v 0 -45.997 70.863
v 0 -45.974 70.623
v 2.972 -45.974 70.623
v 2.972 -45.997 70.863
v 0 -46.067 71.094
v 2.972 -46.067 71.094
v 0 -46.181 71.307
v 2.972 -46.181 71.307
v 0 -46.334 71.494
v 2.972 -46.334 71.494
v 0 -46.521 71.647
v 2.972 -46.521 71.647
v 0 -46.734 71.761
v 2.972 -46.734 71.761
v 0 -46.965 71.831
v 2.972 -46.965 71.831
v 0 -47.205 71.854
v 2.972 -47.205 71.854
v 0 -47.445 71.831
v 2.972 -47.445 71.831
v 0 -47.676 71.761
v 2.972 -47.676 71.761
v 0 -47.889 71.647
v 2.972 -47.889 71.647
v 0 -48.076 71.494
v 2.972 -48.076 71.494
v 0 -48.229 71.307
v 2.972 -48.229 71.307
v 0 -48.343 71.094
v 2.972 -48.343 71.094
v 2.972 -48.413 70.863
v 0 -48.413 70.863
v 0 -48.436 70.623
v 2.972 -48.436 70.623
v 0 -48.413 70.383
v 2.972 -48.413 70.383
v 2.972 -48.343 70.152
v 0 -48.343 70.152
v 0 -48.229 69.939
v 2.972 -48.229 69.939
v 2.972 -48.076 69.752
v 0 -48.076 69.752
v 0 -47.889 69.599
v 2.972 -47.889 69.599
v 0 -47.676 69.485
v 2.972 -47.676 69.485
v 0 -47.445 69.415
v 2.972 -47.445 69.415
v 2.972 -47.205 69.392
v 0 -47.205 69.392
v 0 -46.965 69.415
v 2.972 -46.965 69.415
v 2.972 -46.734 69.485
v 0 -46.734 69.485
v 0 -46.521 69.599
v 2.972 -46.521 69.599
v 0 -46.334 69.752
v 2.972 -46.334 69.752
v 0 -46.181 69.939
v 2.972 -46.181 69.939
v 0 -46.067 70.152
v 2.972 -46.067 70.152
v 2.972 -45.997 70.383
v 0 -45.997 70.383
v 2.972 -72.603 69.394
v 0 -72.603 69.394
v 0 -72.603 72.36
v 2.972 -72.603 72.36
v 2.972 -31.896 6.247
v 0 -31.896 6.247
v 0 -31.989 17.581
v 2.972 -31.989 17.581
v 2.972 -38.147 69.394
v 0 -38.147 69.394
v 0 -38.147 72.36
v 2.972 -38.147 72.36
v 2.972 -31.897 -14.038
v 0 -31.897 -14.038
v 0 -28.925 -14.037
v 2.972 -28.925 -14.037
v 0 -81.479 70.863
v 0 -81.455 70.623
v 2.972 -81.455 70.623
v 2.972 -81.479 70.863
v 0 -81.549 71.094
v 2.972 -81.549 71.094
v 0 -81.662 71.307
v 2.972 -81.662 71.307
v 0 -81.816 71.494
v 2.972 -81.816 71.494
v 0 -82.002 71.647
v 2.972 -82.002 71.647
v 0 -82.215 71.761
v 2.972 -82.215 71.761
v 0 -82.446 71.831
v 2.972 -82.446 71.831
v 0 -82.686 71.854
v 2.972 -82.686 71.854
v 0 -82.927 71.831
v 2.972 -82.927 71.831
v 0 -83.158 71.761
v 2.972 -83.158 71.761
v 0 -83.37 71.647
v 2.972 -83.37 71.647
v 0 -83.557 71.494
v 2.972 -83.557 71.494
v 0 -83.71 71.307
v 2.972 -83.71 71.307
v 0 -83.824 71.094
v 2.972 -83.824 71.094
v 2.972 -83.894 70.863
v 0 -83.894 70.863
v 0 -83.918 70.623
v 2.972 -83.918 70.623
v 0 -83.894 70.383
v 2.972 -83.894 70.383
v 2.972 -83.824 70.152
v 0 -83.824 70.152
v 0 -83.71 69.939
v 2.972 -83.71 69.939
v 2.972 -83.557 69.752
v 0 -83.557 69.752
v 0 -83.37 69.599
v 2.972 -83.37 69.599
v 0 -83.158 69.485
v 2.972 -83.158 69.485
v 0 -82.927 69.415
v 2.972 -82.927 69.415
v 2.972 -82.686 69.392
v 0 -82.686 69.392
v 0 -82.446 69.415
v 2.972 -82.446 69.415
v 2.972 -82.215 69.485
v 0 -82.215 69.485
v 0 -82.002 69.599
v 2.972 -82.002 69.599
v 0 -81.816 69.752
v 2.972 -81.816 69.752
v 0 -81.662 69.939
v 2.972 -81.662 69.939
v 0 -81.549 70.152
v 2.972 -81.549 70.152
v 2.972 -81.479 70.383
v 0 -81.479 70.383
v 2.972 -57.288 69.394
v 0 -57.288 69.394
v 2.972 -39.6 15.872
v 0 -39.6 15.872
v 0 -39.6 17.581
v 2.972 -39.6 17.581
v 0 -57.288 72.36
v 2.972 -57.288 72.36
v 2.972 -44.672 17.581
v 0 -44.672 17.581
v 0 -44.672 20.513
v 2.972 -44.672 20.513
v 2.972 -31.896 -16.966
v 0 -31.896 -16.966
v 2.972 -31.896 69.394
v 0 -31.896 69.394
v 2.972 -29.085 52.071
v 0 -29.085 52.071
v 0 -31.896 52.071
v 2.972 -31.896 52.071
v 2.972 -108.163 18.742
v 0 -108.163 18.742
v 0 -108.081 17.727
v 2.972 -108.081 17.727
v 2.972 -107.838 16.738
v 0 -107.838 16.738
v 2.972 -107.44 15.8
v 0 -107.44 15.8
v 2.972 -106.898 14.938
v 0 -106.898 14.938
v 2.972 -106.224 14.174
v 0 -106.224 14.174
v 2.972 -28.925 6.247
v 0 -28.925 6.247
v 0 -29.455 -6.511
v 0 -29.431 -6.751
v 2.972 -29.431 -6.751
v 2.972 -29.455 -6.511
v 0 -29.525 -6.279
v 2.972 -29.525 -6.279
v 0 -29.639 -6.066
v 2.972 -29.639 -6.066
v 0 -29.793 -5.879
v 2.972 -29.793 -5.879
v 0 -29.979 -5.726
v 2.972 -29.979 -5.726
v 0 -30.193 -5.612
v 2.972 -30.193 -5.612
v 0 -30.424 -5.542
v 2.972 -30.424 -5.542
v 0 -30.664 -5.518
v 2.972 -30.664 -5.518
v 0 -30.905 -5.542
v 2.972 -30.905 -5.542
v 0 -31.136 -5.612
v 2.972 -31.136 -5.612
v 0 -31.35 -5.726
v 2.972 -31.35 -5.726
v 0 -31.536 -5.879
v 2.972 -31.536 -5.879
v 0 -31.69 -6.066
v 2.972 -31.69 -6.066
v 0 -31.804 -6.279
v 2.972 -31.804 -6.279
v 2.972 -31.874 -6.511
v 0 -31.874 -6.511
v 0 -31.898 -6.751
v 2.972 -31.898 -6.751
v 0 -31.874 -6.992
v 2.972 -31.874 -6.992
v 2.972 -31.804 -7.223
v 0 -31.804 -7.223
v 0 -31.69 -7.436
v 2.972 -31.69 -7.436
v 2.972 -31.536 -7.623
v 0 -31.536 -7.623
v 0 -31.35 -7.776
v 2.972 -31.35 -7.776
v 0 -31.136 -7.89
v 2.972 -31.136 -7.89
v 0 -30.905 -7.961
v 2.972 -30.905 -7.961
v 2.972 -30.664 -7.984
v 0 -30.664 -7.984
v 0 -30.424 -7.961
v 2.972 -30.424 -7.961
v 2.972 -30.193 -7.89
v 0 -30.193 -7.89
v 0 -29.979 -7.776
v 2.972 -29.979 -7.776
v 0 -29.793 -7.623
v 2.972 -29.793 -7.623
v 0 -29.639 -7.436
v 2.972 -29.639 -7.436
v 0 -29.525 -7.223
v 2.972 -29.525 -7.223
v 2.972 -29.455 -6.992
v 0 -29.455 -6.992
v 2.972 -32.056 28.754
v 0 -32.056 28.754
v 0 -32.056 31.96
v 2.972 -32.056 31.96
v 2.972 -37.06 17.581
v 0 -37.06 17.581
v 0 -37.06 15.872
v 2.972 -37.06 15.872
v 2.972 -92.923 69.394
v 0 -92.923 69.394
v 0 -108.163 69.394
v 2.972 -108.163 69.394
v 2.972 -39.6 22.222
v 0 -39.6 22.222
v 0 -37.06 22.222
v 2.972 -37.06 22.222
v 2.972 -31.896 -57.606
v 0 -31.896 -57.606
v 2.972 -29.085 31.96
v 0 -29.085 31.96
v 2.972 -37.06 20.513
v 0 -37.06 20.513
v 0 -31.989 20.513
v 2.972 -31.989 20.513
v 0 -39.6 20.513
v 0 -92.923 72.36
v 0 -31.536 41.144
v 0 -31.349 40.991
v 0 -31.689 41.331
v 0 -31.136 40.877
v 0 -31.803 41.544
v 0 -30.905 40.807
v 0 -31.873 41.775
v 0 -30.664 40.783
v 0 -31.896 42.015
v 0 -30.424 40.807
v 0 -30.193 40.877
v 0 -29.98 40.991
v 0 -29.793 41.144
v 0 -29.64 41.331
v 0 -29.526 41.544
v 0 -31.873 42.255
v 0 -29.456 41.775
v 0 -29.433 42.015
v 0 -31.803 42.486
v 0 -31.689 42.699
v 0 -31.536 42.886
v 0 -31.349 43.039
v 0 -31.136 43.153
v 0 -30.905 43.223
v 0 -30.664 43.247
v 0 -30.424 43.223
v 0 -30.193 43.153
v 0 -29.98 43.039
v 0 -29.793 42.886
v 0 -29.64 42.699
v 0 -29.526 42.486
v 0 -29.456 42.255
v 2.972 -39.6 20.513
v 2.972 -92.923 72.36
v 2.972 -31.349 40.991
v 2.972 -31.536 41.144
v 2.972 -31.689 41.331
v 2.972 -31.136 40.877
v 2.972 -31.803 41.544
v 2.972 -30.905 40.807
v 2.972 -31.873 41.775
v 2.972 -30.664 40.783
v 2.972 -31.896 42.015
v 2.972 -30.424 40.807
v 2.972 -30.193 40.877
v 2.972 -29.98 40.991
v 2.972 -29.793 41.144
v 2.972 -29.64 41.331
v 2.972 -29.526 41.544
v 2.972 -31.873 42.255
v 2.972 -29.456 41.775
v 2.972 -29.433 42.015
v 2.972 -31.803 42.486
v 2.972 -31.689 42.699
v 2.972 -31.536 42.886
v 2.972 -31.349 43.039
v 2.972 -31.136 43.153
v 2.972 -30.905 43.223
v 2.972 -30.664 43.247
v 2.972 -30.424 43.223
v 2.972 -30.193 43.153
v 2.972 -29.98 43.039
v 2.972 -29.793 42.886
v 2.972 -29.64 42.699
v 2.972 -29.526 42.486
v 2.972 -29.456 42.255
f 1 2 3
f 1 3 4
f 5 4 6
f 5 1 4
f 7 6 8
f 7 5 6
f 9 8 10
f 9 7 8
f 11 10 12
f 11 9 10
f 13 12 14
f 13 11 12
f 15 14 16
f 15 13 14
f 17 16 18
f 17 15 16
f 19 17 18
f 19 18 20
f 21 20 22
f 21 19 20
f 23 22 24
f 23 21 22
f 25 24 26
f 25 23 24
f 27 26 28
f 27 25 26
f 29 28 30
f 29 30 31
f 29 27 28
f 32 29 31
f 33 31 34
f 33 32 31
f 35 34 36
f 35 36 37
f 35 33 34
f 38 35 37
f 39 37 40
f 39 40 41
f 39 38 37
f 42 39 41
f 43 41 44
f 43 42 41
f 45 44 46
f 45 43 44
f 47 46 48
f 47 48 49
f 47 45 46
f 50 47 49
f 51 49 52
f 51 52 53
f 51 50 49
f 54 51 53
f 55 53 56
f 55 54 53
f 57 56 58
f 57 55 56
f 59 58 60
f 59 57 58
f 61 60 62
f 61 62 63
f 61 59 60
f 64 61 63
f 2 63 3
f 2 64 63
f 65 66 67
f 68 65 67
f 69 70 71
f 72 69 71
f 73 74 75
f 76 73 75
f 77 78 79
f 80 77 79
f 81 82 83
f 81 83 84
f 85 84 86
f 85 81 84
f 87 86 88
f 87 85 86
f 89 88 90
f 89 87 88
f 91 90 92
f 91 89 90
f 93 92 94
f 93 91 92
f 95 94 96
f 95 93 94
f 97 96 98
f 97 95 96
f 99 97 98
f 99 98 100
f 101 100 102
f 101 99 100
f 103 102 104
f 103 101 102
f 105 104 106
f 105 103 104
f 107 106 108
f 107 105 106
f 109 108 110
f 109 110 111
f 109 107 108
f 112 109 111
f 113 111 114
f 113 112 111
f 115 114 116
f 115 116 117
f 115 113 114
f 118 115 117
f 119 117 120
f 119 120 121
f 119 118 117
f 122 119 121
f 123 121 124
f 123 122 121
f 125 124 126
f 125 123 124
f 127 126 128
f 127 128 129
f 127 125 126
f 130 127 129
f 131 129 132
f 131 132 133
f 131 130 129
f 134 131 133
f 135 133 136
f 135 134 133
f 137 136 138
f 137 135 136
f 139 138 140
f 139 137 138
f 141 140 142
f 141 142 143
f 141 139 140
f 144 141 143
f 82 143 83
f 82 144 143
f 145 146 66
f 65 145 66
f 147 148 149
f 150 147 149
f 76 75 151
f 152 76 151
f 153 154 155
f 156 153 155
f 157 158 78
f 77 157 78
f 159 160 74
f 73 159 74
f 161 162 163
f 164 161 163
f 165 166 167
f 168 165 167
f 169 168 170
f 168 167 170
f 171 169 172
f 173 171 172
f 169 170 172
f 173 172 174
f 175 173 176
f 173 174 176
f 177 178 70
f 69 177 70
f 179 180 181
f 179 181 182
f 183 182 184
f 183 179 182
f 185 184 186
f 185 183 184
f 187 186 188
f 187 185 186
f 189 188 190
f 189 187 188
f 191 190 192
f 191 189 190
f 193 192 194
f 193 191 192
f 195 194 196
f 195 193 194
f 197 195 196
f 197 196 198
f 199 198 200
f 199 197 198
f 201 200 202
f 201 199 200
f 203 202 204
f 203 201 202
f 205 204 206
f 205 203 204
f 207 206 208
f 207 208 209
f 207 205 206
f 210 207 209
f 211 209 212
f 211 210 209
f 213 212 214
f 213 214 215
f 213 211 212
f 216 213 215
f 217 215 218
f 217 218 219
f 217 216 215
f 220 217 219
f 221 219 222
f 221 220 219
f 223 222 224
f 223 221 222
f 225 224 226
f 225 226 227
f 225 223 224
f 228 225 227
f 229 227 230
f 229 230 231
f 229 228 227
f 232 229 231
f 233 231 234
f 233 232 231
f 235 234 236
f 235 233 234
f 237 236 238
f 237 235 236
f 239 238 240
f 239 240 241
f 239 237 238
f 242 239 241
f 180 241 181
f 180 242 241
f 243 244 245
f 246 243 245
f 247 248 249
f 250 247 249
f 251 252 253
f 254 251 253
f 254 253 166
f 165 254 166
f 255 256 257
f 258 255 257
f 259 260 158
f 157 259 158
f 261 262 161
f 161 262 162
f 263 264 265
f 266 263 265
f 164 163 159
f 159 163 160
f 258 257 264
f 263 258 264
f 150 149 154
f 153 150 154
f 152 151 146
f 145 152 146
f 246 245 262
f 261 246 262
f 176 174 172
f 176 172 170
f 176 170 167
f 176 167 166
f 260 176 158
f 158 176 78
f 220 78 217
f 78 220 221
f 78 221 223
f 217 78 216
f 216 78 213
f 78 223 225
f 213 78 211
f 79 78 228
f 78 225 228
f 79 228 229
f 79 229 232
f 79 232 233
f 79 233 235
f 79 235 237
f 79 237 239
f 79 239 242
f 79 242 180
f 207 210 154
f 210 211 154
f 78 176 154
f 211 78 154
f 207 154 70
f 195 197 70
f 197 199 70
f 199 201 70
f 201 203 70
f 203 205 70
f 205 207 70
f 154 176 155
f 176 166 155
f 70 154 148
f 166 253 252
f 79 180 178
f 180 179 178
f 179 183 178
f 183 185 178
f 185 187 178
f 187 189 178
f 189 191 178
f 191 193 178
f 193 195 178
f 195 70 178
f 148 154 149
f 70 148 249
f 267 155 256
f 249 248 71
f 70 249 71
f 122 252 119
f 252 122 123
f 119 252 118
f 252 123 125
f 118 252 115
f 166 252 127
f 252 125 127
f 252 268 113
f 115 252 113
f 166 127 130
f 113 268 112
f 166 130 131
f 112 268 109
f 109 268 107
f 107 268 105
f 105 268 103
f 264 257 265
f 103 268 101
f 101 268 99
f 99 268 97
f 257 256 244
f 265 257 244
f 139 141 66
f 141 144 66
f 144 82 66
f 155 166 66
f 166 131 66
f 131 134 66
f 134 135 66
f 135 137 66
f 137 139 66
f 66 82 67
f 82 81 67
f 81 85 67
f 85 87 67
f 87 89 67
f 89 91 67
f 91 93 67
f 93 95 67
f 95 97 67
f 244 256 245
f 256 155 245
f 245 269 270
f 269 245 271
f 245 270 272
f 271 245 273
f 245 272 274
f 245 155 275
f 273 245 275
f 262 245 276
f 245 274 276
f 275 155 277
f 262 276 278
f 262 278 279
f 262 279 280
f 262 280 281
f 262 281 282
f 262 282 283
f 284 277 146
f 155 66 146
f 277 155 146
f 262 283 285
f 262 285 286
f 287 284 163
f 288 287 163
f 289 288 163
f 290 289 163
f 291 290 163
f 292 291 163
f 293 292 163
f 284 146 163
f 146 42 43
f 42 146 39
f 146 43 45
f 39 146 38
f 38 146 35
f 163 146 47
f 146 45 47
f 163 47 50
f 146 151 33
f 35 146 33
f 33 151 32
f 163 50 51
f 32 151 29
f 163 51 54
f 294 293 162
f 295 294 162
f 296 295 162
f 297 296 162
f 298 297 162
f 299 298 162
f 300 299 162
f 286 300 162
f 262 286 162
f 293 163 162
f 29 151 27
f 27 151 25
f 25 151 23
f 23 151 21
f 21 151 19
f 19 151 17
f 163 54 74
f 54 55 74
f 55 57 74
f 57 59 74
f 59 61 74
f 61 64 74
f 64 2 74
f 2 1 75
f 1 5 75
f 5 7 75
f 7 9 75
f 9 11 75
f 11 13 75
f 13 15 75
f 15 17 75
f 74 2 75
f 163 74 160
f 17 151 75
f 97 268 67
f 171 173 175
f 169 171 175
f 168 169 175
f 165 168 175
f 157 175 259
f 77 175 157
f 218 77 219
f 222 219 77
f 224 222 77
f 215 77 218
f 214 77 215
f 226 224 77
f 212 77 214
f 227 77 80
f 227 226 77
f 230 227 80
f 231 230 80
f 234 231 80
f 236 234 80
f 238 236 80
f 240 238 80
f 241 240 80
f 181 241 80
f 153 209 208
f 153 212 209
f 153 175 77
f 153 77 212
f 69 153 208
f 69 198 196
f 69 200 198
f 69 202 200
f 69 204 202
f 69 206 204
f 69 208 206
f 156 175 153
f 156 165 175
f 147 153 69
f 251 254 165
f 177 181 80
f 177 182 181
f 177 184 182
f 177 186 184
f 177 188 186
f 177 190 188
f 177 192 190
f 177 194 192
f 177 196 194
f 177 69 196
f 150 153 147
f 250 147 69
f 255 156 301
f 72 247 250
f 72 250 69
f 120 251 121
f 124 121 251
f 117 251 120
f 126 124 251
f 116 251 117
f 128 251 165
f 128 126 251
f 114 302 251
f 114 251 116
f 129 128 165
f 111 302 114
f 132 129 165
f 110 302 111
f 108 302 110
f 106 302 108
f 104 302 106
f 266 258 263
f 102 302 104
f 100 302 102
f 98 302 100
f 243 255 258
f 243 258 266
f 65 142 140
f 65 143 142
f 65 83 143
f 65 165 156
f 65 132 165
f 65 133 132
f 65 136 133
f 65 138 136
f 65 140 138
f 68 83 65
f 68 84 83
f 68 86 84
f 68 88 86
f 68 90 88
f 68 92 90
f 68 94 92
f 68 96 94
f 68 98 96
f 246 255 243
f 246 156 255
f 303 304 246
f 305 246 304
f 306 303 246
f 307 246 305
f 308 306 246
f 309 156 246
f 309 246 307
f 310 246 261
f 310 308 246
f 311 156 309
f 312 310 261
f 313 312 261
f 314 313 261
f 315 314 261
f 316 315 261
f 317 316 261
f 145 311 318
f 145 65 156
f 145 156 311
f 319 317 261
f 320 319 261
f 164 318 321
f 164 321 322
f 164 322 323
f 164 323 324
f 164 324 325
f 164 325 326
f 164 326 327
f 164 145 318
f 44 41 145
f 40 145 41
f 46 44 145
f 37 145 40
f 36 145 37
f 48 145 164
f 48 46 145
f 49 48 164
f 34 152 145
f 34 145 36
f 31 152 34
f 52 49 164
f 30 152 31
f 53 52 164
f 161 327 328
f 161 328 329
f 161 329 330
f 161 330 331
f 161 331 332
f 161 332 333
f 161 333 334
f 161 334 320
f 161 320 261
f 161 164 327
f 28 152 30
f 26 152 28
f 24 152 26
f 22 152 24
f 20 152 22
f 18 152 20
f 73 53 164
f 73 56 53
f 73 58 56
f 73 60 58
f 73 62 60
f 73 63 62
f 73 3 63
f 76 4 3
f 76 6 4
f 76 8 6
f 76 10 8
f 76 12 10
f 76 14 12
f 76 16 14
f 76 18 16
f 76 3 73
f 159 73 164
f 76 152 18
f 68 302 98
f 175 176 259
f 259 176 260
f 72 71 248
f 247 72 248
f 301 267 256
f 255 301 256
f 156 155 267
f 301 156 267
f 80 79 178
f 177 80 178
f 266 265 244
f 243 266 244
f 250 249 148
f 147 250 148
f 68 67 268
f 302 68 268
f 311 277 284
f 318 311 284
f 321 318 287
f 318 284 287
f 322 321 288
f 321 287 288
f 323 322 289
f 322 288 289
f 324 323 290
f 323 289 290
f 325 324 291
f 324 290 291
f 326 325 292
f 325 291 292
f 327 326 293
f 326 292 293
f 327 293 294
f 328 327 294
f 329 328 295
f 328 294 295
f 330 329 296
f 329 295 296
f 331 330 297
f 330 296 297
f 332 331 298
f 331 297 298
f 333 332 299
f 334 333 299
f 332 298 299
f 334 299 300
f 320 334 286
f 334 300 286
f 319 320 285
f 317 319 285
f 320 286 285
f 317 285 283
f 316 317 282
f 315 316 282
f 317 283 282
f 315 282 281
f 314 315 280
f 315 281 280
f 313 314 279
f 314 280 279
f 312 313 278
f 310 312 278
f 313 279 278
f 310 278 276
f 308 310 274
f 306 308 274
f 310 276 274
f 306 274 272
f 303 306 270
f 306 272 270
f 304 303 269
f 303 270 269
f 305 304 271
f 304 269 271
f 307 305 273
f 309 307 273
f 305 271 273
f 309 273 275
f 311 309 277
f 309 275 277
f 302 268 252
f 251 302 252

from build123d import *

# Parameters (mm, degrees)
F0_R     = 1.2331232955
F0_R_2   = 1.2314274958
F1_DEPTH = 2.9718


# Not quite as in the source:
# - a feature names something its author has since deleted; it is built from what else it names


with BuildPart() as f1:
    # F0 (on Right) → F1 (new body)
    with BuildSketch(Plane.YZ):
        with BuildLine():
            Line((-31.8963663923, 52.0706325769), (-31.8963663923, 69.3939922799))
            Line((-31.8963663923, 69.3939922799), (-36.9763663923, 69.3939922799))
            Line((-36.9763663923, 69.3939922799), (-38.147252053, 69.3939922799))
            Line((-38.147252053, 69.3939922799), (-38.147252053, 72.360080524))
            Line((-38.147252053, 72.360080524), (-57.2884293294, 72.360080524))
            Line((-57.2884293294, 72.360080524), (-57.2884293294, 69.3939922799))
            Line((-57.2884293294, 69.3939922799), (-72.6028546119, 69.3939922799))
            Line((-72.6028546119, 69.3939922799), (-72.6028546119, 72.360080524))
            Line((-72.6028546119, 72.360080524), (-92.9228546119, 72.360080524))
            Line((-92.9228546119, 72.360080524), (-92.9228546119, 69.3939922799))
            Line((-92.9228546119, 69.3939922799), (-108.1628546119, 69.3939922799))
            Line((-108.1628546119, 69.3939922799), (-108.1628546119, 18.7421012782))
            ThreePointArc((-108.1628546119, 18.7421012782), (-107.6580863604, 16.2610196982), (-106.2240307358, 14.1743857437))
            Line((-106.2240307358, 14.1743857437), (-31.8963663923, -57.6060077201))
            Line((-31.8963663923, -57.6060077201), (-31.8963663923, -16.9660077201))
            Line((-31.8963663923, -16.9660077201), (-31.8967170966, -14.0375348575))
            Line((-31.8967170966, -14.0375348575), (-28.9245663923, -14.0371789226))
            Line((-28.9245663923, -14.0371789226), (-28.9245663923, 3.3539922799))
            Line((-28.9245663923, 3.3539922799), (-28.9245663923, 6.2467521057))
            Line((-28.9245663923, 6.2467521057), (-31.8963663923, 6.2467521057))
            Line((-31.8963663923, 6.2467521057), (-31.988988285, 17.581195007))
            Line((-31.988988285, 17.581195007), (-37.0603909409, 17.581195007))
            Line((-37.0603909409, 17.581195007), (-37.0603909409, 15.8720928303))
            Line((-37.0603909409, 15.8720928303), (-39.6003909409, 15.8720928303))
            Line((-39.6003909409, 15.8720928303), (-39.6003909409, 17.581195007))
            Line((-39.6003909409, 17.581195007), (-44.6717935968, 17.581195007))
            Line((-44.6717935968, 17.581195007), (-44.6717935968, 20.5129906535))
            Line((-44.6717935968, 20.5129906535), (-39.6003909409, 20.5129906535))
            Line((-39.6003909409, 20.5129906535), (-39.6003909409, 22.2220928303))
            Line((-39.6003909409, 22.2220928303), (-37.0603909409, 22.2220928303))
            Line((-37.0603909409, 22.2220928303), (-37.0603909409, 20.5129906535))
            Line((-37.0603909409, 20.5129906535), (-31.988988285, 20.5129906535))
            Line((-31.988988285, 20.5129906535), (-32.0563334468, 28.7542376011))
            Line((-32.0563334468, 28.7542376011), (-32.0563334468, 31.9596784297))
            Line((-32.0563334468, 31.9596784297), (-29.0845334468, 31.9596784297))
            Line((-29.0845334468, 31.9596784297), (-29.0845334468, 49.0742376011))
            Line((-29.0845334468, 49.0742376011), (-29.0845334468, 52.0706325769))
            Line((-29.0845334468, 52.0706325769), (-31.8963663923, 52.0706325769))
        make_face()
        with Locations((-30.6644663923, -6.7510945896)):
            Circle(F0_R, mode=Mode.SUBTRACT)
        with Locations((-82.6862763941, 70.623036402)):
            Circle(F0_R_2, mode=Mode.SUBTRACT)
        with BuildLine():
            ThreePointArc((-29.4325663923, 42.0150328428), (-30.6644663923, 40.7831328428), (-31.8963663923, 42.0150328428))
            ThreePointArc((-31.8963663923, 42.0150328428), (-30.6644663923, 43.2469328428), (-29.4325663923, 42.0150328428))
        make_face(mode=Mode.SUBTRACT)
        with Locations((-47.2050075472, 70.623036402)):
            Circle(F0_R_2, mode=Mode.SUBTRACT)
    extrude(amount=F1_DEPTH)


solid = f1.part
